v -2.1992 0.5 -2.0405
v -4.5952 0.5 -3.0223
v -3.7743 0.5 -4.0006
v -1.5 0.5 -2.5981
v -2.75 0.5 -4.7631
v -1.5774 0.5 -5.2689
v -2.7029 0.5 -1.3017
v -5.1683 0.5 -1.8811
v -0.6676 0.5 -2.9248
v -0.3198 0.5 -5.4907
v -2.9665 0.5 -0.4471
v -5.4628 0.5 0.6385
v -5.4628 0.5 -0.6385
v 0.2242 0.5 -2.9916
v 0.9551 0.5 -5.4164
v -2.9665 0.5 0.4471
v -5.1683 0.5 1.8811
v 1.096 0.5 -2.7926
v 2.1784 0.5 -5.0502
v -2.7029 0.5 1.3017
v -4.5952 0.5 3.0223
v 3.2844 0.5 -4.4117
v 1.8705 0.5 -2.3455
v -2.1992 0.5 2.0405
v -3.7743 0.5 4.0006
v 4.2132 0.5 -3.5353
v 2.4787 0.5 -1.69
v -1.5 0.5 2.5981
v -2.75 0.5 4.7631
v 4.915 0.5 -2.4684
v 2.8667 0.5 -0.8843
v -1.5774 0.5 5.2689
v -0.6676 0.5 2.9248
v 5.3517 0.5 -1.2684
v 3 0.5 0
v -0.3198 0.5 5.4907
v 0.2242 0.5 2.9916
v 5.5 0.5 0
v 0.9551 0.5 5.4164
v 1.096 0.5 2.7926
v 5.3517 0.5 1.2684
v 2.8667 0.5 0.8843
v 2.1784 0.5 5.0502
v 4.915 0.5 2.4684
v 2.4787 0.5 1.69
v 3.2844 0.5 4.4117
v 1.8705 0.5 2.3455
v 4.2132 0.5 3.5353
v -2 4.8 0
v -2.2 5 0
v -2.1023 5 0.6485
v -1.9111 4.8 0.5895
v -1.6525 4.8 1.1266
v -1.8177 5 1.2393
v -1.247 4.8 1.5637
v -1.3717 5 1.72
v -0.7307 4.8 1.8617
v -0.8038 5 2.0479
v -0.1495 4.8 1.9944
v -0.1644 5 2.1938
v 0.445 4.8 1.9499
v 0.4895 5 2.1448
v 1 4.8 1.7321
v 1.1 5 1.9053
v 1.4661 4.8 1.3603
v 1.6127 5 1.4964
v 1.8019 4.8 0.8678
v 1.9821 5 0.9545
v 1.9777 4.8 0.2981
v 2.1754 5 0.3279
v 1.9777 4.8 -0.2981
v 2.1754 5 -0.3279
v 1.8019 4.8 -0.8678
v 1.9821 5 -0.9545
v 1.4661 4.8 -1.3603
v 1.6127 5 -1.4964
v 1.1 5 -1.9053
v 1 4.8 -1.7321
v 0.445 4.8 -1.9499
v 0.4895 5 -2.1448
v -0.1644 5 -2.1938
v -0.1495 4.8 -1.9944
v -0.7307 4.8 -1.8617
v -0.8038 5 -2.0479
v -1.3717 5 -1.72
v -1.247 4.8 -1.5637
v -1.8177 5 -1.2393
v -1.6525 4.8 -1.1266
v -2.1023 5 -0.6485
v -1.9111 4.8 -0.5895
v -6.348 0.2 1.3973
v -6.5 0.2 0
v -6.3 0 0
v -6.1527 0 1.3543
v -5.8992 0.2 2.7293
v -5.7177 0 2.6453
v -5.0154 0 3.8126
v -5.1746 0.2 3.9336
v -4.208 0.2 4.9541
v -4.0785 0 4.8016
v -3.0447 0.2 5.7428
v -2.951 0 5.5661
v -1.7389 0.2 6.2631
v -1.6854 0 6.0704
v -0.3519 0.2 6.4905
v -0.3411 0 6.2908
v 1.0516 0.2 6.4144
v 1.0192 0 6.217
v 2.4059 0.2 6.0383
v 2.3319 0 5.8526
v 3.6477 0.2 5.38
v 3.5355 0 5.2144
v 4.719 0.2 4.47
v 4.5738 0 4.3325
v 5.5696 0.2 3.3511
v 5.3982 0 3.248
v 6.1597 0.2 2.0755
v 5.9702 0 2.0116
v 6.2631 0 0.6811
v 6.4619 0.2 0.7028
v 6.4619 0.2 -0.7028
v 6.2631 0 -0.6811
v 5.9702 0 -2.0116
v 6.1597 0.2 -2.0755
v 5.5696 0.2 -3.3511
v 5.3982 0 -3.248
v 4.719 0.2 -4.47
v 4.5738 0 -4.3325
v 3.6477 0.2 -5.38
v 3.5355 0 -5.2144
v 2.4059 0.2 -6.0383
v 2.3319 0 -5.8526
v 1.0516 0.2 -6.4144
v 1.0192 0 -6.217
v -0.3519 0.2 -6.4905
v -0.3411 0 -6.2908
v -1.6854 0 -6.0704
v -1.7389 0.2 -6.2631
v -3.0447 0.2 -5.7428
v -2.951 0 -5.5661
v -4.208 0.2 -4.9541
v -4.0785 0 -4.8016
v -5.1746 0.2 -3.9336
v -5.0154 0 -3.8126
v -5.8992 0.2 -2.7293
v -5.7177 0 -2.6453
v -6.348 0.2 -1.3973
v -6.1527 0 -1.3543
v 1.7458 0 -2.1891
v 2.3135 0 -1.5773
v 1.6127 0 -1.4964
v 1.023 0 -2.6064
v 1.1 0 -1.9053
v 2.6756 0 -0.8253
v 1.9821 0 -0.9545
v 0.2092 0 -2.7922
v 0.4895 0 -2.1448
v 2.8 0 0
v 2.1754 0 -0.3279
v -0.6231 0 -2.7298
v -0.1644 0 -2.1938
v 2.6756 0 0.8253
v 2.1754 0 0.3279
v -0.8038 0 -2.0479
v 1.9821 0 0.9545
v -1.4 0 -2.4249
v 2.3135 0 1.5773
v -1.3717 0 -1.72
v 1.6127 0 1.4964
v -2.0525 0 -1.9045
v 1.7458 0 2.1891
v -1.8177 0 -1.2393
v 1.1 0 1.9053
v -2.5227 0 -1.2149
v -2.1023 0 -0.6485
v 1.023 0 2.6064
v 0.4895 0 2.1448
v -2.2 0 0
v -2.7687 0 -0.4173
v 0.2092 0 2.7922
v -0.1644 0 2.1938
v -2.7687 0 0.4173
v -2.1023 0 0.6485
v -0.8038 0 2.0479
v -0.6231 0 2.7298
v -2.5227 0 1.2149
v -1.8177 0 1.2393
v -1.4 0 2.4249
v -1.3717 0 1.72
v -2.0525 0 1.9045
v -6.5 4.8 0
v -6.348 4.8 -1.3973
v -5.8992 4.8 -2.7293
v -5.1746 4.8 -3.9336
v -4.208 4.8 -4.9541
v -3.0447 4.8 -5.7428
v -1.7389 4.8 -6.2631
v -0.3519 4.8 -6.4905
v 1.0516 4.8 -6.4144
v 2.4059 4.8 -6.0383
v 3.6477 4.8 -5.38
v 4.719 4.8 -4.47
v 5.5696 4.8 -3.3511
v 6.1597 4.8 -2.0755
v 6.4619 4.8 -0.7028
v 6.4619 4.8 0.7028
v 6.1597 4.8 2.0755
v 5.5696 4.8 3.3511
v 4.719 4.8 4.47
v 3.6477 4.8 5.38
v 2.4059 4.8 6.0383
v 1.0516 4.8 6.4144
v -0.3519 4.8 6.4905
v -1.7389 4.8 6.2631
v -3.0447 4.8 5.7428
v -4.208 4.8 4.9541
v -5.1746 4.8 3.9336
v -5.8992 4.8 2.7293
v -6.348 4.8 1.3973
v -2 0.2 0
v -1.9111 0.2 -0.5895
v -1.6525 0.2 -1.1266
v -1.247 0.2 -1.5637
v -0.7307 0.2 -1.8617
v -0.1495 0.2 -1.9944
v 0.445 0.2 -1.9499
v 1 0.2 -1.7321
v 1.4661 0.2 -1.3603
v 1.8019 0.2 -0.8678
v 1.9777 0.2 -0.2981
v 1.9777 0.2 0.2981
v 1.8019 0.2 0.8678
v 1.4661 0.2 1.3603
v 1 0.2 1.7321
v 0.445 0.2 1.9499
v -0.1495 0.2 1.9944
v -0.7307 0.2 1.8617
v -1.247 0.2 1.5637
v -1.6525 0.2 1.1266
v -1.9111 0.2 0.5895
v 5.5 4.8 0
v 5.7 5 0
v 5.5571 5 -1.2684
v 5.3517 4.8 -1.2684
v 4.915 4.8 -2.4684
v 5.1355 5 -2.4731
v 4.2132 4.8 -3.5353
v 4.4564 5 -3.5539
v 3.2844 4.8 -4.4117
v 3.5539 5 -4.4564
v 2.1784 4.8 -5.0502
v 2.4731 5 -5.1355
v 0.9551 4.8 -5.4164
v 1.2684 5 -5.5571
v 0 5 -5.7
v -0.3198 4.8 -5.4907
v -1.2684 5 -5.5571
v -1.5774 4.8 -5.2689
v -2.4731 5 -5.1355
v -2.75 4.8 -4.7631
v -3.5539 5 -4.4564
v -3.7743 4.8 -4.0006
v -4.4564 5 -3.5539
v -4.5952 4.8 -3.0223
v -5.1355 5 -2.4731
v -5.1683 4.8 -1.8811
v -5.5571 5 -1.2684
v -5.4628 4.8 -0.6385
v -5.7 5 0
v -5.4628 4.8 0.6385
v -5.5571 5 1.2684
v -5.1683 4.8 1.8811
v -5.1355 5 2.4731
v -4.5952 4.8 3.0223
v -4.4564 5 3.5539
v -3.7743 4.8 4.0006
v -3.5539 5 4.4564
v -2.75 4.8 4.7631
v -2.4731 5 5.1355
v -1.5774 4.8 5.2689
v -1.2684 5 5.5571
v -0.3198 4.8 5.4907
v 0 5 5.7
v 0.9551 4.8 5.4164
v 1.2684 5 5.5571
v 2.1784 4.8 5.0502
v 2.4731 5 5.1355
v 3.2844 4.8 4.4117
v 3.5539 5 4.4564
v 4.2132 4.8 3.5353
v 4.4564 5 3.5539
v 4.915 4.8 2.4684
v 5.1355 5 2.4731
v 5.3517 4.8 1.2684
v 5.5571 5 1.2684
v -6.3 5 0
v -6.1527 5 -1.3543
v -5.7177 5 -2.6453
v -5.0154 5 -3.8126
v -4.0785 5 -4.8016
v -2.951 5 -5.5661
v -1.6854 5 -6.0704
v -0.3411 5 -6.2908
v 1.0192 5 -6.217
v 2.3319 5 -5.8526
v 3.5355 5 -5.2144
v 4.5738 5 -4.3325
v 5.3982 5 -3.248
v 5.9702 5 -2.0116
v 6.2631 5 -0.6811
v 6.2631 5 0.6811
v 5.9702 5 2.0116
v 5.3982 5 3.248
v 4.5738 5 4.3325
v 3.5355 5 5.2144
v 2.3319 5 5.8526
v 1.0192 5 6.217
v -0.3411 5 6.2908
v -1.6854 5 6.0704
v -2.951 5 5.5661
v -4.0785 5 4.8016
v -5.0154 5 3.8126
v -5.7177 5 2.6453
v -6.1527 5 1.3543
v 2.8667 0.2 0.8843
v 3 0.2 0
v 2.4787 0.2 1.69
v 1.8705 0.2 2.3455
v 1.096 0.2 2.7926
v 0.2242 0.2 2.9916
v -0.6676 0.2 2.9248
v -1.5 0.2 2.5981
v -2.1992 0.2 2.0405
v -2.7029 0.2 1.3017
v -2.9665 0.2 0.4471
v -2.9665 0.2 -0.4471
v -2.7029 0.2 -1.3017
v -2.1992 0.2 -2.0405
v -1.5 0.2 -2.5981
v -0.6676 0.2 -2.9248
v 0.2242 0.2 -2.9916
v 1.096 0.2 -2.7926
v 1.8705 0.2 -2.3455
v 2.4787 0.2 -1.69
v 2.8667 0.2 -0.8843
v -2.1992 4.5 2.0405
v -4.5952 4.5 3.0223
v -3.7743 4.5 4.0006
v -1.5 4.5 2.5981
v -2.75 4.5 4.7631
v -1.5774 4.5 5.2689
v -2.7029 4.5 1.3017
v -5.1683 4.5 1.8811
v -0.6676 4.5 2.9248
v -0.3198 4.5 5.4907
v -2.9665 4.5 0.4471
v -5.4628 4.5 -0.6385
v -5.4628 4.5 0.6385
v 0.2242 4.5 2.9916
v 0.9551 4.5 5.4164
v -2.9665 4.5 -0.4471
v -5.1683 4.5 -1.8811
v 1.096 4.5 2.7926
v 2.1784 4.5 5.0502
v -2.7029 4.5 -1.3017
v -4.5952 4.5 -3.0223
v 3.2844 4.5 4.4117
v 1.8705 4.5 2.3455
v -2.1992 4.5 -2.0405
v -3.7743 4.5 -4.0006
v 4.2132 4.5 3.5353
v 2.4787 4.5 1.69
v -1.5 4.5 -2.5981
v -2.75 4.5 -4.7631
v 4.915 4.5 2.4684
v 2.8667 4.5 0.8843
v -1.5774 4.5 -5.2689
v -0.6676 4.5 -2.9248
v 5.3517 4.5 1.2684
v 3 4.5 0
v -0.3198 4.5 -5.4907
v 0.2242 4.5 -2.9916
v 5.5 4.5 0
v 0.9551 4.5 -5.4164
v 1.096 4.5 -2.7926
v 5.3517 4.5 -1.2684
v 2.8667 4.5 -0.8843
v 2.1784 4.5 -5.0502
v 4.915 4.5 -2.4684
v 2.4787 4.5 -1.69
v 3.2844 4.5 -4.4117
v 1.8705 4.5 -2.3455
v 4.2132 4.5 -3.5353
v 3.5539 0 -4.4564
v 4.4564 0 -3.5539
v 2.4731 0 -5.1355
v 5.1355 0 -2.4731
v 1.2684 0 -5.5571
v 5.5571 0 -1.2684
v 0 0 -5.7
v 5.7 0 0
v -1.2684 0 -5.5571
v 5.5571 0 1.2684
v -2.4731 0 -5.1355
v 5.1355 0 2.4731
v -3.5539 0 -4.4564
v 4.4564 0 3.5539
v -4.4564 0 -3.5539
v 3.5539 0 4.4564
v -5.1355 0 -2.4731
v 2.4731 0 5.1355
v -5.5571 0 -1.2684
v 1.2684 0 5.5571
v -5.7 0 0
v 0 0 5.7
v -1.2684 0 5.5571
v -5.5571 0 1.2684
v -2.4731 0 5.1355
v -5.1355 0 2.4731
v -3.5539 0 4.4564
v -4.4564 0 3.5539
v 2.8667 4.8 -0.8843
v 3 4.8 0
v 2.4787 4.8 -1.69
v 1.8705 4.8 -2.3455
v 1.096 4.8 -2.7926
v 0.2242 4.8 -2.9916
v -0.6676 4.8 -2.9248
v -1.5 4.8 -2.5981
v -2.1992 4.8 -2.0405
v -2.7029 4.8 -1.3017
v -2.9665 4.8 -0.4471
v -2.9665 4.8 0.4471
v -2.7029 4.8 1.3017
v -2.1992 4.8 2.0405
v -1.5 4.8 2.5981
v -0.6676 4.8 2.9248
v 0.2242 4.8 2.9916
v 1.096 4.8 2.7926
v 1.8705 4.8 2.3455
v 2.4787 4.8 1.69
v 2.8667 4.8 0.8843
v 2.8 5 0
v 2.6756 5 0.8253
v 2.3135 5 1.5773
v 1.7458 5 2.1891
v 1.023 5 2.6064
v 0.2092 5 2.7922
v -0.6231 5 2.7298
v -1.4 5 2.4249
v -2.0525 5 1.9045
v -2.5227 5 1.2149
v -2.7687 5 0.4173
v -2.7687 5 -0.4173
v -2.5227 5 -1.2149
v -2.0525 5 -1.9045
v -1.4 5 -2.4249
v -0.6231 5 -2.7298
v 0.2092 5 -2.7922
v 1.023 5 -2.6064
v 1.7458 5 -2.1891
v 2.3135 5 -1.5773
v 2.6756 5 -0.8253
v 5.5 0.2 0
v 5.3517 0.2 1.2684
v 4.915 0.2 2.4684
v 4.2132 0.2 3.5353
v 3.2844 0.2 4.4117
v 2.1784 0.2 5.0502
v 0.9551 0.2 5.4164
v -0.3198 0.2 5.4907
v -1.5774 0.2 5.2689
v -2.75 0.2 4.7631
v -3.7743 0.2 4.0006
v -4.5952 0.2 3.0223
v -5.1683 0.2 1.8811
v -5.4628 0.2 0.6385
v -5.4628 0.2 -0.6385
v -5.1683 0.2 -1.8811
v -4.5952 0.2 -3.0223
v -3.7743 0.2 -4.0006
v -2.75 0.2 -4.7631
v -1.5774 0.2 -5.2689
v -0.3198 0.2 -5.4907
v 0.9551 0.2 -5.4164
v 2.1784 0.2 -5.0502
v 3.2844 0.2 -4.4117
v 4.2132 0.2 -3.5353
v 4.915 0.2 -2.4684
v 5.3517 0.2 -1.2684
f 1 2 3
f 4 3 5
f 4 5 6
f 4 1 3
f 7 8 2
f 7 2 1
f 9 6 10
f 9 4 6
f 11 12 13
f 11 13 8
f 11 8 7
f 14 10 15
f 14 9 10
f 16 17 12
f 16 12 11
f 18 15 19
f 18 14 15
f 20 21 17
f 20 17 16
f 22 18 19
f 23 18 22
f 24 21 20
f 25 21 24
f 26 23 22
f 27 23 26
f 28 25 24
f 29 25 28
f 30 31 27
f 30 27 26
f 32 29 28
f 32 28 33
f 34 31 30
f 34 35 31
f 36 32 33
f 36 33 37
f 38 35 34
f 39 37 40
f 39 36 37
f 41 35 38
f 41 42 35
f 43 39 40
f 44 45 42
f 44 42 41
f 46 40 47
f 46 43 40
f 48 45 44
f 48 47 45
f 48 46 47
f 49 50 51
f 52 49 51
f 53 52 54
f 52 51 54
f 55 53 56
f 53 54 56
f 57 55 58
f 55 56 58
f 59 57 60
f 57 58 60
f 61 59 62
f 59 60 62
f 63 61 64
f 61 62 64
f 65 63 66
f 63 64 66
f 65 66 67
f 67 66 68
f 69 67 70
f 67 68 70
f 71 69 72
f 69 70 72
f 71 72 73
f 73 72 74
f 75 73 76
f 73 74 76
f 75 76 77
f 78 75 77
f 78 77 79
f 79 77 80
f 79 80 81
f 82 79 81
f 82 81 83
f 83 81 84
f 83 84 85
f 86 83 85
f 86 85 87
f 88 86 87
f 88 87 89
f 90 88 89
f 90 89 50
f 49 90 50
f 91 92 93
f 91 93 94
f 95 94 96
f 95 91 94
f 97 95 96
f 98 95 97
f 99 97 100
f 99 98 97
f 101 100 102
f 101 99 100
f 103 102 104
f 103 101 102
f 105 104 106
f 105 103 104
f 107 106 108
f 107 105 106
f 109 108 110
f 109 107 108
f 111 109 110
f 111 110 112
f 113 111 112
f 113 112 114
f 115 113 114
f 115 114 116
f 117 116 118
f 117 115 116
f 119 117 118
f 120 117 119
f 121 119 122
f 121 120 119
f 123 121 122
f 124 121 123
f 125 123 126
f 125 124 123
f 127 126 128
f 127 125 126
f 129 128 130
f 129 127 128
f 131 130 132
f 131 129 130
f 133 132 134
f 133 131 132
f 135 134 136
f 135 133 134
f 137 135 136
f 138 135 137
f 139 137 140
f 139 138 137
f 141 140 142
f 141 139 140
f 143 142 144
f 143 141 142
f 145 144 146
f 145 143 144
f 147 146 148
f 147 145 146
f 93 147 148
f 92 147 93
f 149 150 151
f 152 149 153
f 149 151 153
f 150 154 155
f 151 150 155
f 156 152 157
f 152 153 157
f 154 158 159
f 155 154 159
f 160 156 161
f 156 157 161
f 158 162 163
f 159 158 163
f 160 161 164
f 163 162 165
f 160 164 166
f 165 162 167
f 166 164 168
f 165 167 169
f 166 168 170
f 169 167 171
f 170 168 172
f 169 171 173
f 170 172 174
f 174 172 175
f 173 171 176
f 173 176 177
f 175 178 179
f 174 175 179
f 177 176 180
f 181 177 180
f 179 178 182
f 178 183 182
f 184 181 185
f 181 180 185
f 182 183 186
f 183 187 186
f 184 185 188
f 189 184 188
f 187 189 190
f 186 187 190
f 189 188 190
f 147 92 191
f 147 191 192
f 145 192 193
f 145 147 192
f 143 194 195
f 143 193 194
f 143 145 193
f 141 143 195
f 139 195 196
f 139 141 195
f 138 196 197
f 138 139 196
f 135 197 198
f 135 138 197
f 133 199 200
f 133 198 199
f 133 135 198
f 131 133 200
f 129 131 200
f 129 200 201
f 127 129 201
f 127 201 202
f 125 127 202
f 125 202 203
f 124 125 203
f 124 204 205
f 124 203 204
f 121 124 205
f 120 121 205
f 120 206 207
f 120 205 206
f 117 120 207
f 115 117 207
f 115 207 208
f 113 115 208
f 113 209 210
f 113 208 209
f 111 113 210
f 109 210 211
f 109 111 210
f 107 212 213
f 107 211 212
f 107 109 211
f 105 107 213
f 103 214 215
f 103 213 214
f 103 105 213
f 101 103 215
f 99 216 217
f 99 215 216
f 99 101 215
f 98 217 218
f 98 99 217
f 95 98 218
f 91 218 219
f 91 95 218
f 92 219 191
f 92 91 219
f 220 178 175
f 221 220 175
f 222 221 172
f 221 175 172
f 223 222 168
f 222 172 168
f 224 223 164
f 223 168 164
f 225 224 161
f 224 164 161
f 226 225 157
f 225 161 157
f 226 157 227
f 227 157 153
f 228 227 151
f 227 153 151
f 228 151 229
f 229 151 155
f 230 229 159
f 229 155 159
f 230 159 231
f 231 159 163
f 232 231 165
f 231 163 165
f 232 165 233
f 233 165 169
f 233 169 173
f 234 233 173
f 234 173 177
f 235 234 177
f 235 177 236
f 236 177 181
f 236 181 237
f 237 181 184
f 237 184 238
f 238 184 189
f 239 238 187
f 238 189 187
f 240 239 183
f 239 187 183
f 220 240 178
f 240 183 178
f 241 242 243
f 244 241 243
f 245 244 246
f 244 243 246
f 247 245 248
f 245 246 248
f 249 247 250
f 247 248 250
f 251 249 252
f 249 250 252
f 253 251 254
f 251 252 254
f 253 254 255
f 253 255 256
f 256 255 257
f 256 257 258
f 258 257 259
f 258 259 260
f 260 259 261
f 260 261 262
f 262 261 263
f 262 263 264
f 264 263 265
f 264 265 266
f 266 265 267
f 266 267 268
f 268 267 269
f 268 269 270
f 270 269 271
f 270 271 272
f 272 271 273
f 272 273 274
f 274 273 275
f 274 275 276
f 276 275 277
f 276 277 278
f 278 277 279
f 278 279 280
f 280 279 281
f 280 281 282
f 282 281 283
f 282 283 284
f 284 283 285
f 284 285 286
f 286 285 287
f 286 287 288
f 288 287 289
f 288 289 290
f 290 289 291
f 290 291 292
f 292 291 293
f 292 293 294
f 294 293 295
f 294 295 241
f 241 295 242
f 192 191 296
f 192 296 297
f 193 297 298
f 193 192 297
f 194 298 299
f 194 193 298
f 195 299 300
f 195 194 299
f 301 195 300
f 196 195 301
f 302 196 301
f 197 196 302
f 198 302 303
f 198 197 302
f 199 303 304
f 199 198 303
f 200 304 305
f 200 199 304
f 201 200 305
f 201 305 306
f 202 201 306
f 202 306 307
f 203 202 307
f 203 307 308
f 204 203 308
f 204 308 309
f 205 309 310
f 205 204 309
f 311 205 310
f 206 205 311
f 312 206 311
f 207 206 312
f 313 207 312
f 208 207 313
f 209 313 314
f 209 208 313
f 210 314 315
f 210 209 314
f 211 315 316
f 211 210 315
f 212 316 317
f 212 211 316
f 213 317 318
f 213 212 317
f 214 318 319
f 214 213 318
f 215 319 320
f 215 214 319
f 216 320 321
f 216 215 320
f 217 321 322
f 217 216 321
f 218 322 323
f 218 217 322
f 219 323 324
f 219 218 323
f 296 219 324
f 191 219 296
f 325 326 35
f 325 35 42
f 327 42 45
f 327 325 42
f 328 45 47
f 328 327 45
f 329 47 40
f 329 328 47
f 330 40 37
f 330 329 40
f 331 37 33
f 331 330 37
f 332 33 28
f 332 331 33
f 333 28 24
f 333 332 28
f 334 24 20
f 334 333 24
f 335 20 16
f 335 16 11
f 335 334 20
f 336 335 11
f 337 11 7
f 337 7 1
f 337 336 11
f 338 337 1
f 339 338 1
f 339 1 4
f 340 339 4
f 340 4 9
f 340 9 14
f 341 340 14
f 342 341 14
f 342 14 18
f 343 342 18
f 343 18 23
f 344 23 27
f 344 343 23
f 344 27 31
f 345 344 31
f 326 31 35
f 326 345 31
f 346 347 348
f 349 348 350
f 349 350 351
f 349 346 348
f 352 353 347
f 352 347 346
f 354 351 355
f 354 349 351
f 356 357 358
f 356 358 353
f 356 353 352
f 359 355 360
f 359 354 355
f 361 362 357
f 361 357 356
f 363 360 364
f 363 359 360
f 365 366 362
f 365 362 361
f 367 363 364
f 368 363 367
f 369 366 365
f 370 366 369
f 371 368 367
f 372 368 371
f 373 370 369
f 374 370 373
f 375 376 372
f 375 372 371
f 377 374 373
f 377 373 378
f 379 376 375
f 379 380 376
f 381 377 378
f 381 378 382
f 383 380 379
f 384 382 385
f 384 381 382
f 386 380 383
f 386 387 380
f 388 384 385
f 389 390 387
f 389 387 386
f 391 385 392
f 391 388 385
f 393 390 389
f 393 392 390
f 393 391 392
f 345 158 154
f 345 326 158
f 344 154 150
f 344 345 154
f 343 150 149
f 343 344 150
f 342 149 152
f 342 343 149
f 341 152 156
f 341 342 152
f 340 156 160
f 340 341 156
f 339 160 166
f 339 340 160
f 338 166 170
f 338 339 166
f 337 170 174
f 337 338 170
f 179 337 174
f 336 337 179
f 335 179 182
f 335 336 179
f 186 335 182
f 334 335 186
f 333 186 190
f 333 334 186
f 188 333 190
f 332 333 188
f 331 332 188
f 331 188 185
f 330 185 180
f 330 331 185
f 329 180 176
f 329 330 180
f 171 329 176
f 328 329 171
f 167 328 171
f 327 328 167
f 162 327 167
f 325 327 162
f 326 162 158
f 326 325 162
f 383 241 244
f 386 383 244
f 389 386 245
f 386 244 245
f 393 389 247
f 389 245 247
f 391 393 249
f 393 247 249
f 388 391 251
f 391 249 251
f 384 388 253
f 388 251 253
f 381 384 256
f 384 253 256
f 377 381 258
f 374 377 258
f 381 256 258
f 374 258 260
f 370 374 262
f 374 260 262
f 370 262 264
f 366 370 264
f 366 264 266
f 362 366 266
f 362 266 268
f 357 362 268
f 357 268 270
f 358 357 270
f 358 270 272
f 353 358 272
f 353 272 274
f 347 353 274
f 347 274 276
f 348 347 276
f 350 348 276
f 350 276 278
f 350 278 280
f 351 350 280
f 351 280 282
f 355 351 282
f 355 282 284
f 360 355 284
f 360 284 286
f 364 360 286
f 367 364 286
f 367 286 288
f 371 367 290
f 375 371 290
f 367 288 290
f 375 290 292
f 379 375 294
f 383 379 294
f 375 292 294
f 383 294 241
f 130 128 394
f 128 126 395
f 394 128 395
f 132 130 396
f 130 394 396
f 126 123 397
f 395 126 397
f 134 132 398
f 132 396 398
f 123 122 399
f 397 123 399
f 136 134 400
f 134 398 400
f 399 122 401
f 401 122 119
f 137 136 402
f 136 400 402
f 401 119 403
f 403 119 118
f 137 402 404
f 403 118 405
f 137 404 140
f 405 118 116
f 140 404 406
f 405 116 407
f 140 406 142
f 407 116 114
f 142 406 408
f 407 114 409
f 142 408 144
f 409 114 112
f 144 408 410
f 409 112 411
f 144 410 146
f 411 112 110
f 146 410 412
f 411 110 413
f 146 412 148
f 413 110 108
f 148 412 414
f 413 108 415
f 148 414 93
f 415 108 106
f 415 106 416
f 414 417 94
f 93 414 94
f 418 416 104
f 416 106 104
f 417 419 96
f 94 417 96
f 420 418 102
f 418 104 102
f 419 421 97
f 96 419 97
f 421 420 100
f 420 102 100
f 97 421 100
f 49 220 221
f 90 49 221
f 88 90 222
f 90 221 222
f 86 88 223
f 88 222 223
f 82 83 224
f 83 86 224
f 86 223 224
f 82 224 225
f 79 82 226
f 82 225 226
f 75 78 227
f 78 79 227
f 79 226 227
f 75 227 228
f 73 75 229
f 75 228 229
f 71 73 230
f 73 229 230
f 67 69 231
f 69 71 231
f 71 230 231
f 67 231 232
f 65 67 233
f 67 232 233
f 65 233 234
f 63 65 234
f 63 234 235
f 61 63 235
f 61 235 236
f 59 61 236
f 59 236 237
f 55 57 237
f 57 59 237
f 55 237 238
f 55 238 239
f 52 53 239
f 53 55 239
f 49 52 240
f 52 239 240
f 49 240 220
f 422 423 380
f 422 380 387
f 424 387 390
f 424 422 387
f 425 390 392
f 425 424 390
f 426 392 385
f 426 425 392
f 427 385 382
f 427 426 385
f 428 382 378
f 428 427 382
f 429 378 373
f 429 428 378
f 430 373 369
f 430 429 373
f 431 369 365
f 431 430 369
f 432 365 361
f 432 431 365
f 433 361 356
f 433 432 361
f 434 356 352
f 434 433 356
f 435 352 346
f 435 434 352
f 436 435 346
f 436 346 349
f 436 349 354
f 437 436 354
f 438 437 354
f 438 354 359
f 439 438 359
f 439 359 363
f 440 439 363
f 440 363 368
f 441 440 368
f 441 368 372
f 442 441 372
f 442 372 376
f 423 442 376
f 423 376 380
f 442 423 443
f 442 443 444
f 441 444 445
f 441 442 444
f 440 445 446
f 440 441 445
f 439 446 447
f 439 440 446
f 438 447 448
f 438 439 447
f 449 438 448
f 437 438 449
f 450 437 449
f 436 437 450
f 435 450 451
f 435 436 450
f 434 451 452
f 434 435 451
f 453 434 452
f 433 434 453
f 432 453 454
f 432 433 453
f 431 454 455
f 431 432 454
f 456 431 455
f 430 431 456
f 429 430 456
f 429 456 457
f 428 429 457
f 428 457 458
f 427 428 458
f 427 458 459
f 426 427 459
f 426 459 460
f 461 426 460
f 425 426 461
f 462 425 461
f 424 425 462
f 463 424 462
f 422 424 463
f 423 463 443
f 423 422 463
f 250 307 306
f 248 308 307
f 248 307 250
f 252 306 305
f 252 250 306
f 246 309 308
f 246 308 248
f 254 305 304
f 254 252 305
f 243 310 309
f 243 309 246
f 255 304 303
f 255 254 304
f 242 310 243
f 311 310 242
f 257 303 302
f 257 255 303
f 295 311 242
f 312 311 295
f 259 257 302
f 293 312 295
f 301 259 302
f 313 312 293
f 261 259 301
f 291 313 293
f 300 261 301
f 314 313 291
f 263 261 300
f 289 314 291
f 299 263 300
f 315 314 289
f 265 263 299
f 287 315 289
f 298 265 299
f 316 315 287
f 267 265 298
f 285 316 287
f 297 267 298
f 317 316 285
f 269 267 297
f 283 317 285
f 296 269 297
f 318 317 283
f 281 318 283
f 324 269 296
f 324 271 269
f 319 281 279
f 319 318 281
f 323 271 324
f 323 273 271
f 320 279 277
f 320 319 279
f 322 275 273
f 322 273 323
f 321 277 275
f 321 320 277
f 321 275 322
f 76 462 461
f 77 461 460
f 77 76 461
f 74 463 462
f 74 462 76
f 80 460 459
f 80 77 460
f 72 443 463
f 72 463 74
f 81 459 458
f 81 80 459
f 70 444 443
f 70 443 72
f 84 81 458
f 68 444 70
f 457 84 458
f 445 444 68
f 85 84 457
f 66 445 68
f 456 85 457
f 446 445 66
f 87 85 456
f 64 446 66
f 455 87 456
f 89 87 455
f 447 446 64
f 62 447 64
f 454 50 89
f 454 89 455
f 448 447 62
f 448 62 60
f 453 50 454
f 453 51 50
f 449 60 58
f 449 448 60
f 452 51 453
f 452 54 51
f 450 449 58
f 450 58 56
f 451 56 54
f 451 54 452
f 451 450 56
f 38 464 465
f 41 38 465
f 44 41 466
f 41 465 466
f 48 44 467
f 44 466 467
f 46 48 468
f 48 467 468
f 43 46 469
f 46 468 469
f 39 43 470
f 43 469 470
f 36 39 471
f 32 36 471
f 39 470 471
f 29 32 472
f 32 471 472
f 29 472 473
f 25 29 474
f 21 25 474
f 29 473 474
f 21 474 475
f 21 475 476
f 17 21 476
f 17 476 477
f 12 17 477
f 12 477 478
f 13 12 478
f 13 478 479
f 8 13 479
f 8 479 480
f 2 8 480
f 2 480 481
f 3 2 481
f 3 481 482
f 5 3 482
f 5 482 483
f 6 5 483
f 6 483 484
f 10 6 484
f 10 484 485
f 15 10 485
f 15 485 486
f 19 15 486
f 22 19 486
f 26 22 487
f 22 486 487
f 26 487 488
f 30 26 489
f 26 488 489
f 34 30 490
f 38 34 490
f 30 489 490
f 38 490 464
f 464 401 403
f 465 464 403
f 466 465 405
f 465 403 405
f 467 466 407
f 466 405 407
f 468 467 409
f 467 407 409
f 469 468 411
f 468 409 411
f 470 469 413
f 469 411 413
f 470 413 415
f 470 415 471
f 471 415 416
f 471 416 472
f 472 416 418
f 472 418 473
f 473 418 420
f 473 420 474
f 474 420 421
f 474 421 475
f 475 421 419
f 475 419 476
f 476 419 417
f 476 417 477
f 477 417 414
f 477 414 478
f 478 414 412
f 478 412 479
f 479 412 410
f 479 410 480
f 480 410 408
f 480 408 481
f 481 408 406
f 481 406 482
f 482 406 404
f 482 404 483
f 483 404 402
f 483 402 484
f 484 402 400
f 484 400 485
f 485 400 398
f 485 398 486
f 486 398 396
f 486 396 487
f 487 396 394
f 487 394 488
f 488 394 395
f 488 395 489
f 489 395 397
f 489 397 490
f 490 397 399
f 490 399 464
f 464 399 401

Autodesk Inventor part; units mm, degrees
ref_plane "YZ Plane" through (0, 0, 0) normal (1, 0, 0) x (0, 1, 0)
ref_plane "XZ Plane" through (0, 0, 0) normal (0, 1, 0) x (-1, 0, 0)
ref_plane "XY Plane" through (0, 0, 0) normal (0, 0, 1) x (1, 0, 0)
sketch "Эскиз1" plane through (0, 0, 0) normal (0, 1, 0) x (-1, 0, 0)
  circle A0 centre (0, 0) radius 6.5
  circle A1 centre (0, 0) radius 2
  dimension "d0" = 13
  dimension "d1" = 4
extrude "Выдавливание1" add sketch "Эскиз1" along normal blind 5
sketch "Эскиз2" plane through (0, 5, 0) normal (0, 1, 0) x (1, 0, 0)
  circle A0 centre (0, 0) radius 3
  circle A1 centre (0, 0) radius 5.5
  circle A2 centre (0, 0) radius 6.5 projected
  circle A3 centre (0, 0) radius 2 projected
  dimension "d4" = 1
  dimension "d5" = 1
extrude "Выдавливание2" cut sketch "Эскиз2" against normal blind 0.5 contours A1
sketch "Эскиз3" plane through (0, 0, 0) normal (0, -1, 0) x (1, 0, 0)
  circle A0 centre (0, 0) radius 3 projected
  circle A1 centre (0, 0) radius 5.5 projected
extrude "Выдавливание3" cut sketch "Эскиз3" against normal blind 0.5
chamfer "Фаска1" distance 0.2 angle 45 8 edges at (-3, 0, 0) (2, 0, 0) (-5.5, 0, 0) (6.5, 0, 0) (6.5, 5, 0) (-5.5, 5, 0) (-3, 5, 0) (2, 5, 0)
properties part number "Подшипник 626Z" material "Титан"
